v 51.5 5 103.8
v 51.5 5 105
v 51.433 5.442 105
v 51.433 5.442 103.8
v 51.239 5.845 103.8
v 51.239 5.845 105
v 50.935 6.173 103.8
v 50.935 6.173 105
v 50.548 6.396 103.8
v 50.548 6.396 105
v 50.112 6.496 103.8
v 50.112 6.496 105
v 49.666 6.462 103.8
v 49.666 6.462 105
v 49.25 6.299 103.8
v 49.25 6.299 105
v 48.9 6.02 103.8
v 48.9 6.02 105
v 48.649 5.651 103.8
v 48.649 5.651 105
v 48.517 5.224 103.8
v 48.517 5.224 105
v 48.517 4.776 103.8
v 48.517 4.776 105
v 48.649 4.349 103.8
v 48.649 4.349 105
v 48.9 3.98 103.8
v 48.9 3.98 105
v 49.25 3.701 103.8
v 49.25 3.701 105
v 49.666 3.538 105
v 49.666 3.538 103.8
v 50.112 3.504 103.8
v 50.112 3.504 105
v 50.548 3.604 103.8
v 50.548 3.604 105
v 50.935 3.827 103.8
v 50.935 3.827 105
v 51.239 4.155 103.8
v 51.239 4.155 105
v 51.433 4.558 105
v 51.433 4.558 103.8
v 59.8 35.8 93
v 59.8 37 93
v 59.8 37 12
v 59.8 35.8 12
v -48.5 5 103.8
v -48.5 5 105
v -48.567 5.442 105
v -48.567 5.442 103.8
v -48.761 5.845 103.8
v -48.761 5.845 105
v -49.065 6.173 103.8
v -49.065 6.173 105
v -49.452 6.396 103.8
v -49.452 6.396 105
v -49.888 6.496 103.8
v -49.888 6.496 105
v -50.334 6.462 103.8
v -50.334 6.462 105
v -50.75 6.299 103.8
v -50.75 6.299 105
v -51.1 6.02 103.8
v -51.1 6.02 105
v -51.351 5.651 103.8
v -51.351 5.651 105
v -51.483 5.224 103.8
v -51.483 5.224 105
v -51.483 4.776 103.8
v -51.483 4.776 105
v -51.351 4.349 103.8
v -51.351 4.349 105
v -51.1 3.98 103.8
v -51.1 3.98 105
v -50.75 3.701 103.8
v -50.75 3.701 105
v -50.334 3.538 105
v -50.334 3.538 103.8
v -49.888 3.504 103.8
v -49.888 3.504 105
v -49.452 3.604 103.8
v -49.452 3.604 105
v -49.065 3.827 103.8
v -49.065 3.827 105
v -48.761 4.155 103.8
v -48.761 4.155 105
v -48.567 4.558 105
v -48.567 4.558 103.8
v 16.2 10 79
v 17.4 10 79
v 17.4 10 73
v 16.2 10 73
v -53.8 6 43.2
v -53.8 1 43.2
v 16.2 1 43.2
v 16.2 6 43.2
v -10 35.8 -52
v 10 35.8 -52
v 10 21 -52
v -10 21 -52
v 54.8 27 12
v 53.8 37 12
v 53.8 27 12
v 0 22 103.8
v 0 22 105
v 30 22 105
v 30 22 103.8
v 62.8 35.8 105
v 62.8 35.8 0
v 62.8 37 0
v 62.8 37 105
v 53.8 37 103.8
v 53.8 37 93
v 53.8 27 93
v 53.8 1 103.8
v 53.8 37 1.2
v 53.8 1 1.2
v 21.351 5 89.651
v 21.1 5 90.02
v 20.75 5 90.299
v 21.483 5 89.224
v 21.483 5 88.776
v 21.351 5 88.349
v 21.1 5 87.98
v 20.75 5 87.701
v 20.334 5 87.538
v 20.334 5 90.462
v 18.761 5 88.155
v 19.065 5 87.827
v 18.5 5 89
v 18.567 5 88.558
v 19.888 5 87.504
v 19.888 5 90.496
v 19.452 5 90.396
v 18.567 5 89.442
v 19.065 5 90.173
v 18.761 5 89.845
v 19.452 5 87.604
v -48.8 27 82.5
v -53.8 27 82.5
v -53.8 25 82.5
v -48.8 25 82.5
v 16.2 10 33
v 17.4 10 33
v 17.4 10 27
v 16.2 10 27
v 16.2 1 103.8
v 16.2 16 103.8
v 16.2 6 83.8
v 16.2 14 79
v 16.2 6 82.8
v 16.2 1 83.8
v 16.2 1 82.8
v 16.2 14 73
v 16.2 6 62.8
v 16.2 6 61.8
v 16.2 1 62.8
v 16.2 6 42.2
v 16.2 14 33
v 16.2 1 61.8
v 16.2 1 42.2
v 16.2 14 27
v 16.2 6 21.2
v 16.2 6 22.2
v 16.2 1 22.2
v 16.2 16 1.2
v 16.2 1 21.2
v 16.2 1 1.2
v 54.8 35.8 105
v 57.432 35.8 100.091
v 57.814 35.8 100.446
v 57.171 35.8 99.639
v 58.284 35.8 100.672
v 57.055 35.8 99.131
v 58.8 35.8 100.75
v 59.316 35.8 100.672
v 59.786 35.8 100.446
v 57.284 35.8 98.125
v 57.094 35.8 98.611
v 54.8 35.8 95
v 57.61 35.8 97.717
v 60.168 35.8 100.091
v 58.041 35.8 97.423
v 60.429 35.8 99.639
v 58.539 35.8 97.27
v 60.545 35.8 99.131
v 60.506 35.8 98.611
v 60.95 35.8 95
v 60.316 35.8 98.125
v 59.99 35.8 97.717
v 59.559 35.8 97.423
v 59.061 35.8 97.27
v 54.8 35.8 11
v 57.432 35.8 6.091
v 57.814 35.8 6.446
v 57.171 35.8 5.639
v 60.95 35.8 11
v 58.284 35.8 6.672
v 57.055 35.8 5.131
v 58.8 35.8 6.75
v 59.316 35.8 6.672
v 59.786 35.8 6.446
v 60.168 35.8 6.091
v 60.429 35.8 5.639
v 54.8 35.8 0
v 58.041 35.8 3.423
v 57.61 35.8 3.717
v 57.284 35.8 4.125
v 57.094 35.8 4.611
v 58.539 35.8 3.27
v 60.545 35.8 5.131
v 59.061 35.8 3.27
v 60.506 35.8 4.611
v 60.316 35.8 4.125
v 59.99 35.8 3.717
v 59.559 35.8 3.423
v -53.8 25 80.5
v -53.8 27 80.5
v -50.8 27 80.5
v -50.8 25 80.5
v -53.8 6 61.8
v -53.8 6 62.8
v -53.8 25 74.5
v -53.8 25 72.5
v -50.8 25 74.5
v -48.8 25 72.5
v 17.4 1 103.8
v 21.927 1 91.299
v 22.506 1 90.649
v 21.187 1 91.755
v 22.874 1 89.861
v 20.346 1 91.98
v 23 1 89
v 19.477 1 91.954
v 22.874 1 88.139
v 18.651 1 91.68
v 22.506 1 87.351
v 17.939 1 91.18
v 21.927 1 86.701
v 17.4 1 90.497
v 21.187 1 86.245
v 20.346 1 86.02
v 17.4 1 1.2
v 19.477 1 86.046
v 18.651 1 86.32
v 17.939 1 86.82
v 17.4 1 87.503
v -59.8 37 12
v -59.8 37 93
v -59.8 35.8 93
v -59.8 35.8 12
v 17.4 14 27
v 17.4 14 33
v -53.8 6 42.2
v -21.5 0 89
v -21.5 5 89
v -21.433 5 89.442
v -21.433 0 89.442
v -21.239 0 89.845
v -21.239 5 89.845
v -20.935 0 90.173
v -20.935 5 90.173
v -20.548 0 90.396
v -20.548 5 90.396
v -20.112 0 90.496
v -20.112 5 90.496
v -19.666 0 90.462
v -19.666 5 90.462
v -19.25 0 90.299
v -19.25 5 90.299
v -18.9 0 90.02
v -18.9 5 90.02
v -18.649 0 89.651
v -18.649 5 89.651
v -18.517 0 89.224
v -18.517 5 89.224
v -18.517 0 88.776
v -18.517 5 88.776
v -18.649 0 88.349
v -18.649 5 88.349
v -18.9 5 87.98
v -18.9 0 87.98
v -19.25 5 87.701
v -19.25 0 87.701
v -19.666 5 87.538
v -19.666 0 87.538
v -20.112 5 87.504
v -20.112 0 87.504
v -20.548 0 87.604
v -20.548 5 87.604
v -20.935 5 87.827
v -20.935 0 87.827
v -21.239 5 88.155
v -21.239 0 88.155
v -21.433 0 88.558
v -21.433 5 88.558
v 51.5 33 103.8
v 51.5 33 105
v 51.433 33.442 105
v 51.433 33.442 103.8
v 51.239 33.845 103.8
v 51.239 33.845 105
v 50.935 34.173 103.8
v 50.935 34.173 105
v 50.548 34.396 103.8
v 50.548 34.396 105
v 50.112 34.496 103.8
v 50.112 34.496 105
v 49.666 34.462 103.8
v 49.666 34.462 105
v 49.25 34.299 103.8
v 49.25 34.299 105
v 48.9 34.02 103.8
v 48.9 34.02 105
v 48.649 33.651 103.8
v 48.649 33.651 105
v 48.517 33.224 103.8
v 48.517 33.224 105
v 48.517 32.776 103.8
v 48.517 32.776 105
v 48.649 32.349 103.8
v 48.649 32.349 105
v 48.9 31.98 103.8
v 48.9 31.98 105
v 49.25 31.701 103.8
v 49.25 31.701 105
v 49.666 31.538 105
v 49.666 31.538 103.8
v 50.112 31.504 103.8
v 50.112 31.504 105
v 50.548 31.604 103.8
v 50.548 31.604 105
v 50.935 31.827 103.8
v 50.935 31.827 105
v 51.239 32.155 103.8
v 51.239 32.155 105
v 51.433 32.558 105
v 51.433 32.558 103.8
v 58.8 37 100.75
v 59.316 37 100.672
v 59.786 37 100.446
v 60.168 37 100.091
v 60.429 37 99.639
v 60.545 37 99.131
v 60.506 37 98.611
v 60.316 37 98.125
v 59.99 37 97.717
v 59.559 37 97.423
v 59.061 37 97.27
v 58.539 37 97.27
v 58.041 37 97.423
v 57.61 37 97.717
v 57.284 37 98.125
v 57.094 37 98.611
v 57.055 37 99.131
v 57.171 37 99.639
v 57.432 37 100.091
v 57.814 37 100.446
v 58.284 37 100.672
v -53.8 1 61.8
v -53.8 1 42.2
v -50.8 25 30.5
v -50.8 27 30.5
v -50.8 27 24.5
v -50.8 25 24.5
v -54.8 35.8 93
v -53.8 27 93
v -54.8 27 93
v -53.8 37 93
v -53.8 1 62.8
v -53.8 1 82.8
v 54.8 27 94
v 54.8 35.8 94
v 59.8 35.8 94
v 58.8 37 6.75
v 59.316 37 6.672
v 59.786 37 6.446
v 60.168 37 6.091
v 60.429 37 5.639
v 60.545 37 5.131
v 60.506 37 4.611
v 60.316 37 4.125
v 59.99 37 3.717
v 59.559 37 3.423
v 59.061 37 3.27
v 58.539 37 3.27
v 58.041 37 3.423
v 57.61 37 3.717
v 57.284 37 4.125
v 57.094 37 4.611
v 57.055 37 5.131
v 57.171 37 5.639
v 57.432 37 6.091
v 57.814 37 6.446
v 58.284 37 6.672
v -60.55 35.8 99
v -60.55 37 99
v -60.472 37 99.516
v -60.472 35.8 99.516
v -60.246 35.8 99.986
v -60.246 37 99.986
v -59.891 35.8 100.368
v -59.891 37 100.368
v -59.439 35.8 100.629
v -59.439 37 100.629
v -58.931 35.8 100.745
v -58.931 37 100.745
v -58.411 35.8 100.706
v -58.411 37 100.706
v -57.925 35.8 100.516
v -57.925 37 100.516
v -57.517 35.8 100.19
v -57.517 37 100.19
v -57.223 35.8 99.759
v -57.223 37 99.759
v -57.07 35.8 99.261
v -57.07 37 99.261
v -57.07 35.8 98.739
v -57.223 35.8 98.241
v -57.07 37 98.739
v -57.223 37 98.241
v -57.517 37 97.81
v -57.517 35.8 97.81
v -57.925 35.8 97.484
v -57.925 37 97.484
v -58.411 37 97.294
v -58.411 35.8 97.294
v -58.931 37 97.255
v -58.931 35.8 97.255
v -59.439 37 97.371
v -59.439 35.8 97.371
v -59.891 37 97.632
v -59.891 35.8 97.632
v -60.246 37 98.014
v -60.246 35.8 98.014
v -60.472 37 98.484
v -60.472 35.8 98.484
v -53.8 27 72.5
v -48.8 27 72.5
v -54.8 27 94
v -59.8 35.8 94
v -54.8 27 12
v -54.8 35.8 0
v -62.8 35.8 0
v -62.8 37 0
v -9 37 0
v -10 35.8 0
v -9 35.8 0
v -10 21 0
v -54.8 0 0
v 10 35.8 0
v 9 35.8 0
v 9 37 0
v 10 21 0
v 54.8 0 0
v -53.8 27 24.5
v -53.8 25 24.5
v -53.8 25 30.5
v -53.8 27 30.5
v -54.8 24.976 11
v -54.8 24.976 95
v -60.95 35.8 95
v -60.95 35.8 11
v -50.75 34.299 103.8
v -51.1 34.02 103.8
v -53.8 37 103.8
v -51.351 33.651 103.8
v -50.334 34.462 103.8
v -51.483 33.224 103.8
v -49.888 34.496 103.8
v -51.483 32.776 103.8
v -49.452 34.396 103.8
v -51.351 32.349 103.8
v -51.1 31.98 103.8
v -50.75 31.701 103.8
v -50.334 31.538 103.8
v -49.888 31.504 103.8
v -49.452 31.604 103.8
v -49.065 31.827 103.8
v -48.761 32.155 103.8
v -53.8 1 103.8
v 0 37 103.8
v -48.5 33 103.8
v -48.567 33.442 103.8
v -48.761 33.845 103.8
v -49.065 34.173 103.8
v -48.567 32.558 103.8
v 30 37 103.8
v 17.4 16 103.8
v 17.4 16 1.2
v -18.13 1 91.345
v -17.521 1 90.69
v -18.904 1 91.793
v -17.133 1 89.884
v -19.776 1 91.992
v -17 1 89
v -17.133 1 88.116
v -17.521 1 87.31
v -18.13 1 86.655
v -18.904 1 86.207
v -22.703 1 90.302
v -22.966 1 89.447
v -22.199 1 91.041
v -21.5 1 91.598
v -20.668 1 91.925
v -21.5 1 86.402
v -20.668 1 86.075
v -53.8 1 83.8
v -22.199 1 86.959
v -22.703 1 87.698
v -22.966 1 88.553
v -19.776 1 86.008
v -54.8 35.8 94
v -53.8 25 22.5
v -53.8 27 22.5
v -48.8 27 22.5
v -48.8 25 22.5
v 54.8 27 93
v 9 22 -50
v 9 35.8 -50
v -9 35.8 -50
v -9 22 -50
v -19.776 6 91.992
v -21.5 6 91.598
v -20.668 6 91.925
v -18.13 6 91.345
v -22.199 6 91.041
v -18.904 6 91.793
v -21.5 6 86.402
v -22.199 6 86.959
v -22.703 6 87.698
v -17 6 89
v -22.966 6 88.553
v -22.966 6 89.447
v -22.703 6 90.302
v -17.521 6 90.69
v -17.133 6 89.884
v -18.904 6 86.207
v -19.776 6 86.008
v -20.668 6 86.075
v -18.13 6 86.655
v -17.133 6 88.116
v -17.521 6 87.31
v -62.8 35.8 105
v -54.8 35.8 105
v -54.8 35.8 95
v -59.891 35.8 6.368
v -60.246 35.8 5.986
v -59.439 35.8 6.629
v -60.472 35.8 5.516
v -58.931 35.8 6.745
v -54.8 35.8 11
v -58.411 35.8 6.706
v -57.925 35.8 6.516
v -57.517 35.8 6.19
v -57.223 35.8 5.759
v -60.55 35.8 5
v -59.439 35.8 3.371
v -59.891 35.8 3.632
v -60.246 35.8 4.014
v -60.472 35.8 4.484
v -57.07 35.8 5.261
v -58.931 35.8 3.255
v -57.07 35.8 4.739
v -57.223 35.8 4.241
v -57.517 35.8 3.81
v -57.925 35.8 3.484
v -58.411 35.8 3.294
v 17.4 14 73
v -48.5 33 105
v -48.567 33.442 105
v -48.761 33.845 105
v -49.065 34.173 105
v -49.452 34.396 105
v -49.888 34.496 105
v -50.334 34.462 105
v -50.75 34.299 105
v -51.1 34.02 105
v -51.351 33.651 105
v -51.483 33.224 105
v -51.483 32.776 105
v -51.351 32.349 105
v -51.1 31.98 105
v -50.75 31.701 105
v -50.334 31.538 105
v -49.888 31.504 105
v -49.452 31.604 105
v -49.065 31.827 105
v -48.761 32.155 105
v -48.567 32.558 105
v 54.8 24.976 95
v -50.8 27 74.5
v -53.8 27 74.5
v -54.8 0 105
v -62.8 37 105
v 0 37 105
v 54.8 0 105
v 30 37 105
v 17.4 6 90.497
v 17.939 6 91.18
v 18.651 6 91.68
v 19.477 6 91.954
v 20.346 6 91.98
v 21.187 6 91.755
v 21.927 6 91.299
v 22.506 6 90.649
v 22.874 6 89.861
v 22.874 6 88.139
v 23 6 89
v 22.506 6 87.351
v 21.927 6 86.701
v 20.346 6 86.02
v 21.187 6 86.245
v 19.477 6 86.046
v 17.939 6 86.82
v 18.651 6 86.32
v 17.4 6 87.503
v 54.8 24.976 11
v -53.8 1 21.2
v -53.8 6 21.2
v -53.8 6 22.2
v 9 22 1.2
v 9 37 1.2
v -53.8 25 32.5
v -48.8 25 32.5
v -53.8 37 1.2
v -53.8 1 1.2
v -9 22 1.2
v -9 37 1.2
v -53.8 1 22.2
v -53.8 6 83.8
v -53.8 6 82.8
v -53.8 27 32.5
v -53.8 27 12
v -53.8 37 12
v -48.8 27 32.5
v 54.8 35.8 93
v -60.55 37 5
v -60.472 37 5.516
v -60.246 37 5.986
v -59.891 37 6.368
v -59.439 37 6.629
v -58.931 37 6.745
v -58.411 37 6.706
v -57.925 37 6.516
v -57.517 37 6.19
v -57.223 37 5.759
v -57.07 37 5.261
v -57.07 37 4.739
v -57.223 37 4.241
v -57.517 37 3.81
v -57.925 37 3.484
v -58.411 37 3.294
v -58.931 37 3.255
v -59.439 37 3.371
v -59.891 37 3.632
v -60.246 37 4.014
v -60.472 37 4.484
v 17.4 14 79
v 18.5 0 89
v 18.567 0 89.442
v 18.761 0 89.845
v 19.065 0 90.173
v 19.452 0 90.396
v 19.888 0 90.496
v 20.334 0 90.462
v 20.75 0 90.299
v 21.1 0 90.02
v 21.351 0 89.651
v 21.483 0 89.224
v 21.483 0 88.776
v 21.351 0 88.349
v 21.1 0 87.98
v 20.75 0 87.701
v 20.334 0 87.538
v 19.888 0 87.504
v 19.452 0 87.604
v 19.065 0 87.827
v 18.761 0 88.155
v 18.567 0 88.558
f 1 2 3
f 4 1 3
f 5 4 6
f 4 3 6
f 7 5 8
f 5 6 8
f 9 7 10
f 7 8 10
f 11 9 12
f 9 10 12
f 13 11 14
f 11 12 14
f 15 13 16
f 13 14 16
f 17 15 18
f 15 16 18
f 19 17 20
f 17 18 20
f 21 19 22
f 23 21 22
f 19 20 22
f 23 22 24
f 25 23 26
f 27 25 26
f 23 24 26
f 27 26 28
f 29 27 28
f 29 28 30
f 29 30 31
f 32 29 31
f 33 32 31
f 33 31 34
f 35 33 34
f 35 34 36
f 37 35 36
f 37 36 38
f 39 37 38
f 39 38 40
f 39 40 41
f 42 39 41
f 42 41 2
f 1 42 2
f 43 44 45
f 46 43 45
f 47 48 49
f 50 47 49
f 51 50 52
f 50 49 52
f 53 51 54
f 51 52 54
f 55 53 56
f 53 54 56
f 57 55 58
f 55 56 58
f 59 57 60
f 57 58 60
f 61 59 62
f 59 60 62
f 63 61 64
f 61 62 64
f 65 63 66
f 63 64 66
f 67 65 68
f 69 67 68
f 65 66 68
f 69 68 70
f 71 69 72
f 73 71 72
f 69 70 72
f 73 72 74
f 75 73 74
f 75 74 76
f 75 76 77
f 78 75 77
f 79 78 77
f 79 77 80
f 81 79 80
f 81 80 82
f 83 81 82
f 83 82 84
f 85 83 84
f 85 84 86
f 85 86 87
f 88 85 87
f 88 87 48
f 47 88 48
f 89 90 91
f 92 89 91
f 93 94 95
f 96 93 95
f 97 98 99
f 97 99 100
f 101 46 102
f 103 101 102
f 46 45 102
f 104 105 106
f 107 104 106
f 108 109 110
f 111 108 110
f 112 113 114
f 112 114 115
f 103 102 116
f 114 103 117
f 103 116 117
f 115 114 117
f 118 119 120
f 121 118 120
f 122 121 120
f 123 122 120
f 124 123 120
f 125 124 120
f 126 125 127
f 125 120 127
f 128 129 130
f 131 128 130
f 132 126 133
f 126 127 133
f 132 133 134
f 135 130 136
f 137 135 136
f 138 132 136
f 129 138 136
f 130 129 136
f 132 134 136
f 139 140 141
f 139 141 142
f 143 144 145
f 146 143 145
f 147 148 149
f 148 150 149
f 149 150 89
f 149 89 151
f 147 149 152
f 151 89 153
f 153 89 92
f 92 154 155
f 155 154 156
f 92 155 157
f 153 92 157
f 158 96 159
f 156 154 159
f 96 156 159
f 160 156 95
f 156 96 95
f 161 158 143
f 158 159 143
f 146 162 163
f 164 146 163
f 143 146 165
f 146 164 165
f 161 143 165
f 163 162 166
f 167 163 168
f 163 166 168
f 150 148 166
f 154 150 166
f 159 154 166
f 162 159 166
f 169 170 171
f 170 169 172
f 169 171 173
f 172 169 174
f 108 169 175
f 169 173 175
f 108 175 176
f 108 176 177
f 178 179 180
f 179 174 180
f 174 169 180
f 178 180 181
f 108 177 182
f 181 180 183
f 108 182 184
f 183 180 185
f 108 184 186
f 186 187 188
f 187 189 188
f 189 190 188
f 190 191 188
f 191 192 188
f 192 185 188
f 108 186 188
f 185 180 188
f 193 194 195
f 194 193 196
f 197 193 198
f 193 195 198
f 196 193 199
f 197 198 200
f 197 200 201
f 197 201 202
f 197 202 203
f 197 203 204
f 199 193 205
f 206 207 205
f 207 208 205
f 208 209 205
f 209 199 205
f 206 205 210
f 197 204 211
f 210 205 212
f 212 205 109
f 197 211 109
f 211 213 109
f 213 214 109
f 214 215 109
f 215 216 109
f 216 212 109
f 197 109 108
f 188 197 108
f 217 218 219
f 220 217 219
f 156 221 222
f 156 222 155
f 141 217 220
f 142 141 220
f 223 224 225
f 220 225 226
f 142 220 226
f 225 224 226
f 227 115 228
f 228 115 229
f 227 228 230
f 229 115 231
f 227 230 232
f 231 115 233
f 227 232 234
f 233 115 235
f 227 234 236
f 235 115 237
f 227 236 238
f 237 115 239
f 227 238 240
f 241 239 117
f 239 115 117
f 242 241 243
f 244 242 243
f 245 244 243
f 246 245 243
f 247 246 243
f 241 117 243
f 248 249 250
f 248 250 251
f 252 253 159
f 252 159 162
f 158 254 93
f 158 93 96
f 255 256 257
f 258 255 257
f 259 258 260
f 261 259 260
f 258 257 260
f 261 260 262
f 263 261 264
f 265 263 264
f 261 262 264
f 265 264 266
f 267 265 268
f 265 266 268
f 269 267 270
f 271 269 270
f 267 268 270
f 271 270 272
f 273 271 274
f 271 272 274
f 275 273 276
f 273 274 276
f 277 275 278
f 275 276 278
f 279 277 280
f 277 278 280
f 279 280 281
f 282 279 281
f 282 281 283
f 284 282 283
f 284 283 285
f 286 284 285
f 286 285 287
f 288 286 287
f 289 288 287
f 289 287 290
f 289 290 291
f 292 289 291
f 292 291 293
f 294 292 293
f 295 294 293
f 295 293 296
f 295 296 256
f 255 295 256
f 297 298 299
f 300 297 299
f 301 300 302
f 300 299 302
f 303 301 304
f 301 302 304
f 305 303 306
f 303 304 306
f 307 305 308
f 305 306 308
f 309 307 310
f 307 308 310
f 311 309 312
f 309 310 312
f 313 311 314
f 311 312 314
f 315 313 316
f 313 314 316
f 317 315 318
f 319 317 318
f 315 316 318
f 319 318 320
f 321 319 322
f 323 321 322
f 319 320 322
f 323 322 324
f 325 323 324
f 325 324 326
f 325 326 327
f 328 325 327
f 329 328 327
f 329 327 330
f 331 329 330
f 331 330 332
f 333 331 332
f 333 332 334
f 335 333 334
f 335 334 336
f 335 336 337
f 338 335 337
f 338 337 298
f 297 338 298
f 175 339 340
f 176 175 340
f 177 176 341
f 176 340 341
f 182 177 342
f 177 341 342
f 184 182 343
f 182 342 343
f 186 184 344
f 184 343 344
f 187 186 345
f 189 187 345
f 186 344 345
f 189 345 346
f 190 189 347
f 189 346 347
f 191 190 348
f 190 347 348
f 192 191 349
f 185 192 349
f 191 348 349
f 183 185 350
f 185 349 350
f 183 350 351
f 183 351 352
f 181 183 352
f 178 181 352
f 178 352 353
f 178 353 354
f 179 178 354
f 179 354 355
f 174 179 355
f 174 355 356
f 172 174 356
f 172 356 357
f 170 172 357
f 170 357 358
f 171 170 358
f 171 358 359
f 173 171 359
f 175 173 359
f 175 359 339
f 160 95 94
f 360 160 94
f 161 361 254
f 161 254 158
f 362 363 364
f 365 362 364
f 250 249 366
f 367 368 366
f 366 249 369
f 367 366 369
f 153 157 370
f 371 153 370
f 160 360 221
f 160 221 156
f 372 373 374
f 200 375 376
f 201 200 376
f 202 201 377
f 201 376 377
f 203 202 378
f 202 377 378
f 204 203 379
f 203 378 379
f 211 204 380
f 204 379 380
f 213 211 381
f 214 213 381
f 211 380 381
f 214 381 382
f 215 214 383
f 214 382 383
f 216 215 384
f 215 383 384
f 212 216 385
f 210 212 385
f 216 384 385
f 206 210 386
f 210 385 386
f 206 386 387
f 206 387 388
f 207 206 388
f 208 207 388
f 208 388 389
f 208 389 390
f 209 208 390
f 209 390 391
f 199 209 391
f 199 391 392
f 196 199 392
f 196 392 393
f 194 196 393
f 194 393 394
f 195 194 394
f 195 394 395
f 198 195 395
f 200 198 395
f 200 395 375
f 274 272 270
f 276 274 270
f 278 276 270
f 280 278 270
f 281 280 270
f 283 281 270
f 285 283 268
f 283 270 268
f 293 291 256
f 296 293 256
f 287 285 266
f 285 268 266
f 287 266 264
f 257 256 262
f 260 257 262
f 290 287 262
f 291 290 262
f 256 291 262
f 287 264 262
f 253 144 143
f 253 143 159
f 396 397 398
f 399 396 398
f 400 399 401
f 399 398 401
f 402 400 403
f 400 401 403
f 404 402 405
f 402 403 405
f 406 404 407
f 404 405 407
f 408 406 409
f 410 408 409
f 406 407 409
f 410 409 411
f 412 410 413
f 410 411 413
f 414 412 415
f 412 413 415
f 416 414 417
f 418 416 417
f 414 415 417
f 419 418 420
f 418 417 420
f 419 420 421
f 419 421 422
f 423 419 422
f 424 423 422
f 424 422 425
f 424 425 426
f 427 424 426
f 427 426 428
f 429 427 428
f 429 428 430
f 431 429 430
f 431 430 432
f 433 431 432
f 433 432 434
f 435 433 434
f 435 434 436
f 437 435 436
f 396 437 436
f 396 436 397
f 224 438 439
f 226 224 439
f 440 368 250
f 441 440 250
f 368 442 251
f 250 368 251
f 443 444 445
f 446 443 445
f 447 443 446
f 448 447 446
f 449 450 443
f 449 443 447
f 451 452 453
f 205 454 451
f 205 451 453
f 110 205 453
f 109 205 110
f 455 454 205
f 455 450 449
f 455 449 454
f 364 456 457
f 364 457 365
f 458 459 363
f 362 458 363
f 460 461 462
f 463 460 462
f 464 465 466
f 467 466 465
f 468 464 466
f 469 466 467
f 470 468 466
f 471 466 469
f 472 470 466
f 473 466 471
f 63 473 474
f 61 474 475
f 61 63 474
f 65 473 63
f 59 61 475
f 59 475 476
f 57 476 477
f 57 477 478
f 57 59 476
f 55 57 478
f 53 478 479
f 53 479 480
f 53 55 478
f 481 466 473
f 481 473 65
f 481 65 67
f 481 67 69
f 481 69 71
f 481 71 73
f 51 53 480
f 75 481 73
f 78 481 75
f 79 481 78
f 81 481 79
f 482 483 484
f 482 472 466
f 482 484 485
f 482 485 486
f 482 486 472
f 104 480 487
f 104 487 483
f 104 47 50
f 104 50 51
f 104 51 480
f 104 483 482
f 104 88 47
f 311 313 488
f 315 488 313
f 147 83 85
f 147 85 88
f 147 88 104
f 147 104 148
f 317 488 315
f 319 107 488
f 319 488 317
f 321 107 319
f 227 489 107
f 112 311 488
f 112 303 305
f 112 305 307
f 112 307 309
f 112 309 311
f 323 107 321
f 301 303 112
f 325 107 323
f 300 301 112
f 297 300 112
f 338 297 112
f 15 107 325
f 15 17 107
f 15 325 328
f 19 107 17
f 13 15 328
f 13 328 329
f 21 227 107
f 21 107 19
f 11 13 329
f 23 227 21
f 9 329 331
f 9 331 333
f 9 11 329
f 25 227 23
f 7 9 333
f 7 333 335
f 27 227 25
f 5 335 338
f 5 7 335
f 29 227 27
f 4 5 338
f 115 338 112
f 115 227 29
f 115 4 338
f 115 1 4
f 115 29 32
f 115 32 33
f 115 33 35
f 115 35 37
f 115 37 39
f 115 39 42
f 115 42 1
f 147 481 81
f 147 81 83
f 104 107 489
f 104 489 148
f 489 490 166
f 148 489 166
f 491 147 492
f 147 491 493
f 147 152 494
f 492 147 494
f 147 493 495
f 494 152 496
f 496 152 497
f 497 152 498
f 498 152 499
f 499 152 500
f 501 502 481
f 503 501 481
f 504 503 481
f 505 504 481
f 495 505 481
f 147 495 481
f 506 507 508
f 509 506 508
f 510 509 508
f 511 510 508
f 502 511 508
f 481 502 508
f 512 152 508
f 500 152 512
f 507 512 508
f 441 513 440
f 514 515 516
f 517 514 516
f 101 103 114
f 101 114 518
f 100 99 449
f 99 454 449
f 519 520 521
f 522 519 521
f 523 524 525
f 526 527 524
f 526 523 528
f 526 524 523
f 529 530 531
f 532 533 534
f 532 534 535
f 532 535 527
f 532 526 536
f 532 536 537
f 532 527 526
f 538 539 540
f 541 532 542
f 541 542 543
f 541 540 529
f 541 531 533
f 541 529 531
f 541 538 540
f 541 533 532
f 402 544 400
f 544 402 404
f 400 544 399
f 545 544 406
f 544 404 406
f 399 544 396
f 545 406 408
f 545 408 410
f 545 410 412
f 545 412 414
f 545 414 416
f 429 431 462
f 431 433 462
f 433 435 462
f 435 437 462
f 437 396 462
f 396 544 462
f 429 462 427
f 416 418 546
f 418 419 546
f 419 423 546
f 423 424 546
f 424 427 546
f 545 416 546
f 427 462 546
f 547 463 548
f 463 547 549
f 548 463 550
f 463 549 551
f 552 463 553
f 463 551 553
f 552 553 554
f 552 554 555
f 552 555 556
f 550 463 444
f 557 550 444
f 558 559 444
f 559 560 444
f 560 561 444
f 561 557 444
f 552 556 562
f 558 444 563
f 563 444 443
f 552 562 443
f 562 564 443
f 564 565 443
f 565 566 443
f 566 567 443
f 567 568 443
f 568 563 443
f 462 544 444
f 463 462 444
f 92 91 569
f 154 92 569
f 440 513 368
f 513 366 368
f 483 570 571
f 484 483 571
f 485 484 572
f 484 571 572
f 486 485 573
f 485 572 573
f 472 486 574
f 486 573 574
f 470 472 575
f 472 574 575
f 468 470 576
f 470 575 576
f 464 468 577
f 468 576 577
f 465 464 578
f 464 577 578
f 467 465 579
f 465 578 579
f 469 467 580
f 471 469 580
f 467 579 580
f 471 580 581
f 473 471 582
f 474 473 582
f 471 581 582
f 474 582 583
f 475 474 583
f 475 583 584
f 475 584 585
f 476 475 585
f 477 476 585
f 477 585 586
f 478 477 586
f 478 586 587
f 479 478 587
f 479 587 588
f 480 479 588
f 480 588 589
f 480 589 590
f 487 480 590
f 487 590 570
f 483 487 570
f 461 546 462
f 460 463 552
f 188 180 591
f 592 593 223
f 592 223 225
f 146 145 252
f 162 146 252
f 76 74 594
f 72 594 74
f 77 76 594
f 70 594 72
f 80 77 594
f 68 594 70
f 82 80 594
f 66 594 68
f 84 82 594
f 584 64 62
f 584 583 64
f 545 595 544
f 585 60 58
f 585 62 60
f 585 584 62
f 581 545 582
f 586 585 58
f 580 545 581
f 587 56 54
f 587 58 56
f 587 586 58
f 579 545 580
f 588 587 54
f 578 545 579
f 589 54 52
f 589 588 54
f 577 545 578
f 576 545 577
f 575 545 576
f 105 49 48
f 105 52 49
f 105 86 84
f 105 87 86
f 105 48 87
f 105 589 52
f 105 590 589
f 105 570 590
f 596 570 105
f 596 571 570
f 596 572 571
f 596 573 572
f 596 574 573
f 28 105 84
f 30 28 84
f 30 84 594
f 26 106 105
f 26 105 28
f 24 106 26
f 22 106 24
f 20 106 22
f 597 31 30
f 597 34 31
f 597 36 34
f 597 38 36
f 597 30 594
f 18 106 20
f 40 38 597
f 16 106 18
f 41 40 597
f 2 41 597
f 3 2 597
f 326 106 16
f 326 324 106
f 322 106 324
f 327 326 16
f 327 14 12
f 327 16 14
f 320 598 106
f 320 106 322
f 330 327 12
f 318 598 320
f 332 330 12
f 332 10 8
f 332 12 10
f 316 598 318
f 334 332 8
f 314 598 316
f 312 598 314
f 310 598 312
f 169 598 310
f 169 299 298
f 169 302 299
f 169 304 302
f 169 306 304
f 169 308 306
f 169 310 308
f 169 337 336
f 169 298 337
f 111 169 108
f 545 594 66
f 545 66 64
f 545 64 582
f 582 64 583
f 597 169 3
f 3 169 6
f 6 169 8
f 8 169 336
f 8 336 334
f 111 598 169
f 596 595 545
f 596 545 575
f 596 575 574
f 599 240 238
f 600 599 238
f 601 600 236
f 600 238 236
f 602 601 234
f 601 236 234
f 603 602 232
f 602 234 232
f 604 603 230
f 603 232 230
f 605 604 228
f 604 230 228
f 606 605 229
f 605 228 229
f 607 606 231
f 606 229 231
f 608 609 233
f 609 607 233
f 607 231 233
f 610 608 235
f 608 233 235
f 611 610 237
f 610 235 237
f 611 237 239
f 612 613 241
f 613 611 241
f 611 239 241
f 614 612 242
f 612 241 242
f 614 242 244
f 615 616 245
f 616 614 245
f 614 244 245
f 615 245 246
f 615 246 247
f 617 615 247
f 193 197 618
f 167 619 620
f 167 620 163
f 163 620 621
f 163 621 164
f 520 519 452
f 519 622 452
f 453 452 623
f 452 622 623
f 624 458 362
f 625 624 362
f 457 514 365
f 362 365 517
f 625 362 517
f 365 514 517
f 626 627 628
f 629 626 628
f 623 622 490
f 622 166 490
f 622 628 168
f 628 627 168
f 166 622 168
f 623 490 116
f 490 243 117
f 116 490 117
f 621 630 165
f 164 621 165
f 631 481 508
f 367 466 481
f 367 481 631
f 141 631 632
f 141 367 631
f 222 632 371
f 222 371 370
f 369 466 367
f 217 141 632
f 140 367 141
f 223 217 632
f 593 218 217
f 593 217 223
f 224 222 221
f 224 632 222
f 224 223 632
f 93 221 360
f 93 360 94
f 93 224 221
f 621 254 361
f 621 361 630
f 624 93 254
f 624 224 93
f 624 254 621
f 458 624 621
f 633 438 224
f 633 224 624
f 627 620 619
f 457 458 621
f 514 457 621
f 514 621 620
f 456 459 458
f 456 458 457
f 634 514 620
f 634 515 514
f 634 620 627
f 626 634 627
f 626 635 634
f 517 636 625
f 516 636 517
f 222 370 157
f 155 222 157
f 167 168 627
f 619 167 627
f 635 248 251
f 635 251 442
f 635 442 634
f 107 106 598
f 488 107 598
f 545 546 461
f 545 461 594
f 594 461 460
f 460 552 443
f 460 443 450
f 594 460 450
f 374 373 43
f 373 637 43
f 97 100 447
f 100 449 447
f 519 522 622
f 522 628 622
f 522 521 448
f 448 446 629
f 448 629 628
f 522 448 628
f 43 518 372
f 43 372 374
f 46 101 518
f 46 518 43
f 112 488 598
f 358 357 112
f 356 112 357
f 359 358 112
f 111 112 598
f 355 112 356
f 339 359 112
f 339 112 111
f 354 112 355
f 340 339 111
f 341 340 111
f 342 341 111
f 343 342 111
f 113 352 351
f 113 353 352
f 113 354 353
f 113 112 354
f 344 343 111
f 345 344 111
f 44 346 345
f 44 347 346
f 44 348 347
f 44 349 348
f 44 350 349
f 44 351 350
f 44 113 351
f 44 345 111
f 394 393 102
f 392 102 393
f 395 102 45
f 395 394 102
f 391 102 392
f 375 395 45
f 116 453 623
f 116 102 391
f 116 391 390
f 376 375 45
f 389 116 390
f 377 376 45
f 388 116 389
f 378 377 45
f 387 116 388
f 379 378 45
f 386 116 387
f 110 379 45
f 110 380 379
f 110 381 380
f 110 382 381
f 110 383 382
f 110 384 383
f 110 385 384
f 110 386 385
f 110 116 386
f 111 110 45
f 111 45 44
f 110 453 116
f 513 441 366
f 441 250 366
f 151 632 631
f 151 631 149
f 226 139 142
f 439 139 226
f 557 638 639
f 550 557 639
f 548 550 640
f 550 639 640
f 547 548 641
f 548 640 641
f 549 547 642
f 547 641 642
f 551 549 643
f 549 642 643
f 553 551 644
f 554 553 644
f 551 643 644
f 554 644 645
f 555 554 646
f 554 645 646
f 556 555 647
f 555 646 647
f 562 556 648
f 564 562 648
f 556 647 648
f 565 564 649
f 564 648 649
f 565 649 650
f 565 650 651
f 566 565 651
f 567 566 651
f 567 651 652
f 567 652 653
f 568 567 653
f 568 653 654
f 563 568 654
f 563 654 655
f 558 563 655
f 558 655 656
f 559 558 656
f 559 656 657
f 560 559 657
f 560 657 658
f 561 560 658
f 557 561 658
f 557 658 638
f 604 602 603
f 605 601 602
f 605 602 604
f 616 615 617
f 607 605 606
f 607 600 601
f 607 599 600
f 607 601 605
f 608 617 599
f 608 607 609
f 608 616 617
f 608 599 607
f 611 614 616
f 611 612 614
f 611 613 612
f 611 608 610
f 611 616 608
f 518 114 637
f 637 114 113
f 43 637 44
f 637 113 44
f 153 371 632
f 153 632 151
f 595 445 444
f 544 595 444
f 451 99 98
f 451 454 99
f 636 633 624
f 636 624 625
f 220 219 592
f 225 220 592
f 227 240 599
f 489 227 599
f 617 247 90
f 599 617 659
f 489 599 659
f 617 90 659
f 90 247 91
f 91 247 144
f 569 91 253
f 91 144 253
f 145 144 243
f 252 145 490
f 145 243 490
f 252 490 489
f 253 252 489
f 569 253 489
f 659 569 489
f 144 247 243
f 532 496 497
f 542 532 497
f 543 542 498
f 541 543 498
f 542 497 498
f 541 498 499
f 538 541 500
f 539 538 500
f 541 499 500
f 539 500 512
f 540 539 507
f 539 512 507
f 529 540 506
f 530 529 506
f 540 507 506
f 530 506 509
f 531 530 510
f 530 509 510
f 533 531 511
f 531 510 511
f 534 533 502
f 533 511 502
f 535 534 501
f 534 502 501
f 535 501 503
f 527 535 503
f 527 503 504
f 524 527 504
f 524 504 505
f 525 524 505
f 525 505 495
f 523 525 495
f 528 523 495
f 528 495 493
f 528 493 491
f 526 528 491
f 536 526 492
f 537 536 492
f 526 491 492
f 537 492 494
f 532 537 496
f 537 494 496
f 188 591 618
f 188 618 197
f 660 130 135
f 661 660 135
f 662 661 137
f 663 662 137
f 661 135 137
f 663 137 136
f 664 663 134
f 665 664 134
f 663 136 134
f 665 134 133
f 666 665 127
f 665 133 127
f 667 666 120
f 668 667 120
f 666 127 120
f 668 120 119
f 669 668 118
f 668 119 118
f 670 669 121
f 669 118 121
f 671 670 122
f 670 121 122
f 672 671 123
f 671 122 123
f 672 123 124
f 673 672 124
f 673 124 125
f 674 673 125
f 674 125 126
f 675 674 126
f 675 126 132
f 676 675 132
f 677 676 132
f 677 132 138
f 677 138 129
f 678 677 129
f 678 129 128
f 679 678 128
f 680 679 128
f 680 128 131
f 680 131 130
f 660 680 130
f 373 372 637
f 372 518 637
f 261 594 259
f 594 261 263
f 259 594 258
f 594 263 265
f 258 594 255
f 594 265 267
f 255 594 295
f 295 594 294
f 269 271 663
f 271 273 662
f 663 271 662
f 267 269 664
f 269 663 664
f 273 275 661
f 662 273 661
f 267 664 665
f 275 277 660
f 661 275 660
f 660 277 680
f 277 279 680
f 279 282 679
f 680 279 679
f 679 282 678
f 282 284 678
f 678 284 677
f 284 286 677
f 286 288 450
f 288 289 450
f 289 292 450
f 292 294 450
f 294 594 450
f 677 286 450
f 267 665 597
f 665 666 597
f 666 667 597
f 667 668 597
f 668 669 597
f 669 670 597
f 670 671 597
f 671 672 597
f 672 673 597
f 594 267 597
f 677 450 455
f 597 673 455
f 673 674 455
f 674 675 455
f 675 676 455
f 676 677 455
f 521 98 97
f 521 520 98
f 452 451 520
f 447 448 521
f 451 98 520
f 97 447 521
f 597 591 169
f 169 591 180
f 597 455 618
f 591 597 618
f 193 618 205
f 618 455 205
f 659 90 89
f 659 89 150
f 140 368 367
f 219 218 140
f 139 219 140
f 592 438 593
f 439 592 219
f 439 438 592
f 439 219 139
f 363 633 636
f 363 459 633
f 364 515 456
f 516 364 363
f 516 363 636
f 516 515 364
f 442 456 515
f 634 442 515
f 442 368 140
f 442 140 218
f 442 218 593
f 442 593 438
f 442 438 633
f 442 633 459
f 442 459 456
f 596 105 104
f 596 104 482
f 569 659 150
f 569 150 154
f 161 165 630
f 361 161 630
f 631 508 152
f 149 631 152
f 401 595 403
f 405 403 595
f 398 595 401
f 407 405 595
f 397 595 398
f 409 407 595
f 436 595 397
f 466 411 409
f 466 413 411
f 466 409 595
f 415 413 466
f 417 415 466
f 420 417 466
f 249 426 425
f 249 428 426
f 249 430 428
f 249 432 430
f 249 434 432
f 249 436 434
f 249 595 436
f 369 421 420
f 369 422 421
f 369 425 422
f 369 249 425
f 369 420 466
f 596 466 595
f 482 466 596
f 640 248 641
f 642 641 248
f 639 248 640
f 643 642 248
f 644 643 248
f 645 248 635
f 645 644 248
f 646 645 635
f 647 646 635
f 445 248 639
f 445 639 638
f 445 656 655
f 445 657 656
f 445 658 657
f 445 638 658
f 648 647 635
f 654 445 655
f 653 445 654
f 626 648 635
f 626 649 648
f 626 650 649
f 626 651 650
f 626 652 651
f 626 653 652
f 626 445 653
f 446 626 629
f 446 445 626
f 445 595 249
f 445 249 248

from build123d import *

# Parameters (mm, degrees)
EXTRUDE_1_DEPTH     = 105
SKETCH_3_W          = 107.6
SKETCH_3_H          = 1.2
EXTRUDE_3_DEPTH     = 36
SKETCH_4_R          = 3
SKETCH_4_W          = 70
SKETCH_4_H          = 1
EXTRUDE_4_DEPTH     = 5
CUT_EXTRUDE_1_REACH = 129.213
CUT_EXTRUDE_START   = -1
SKETCH_5_R          = 1.5
SKETCH_6_R          = 1.75
SKETCH_6_W          = 6
SKETCH_6_H          = 81
CUT_EXTRUDE_2_DEPTH = 10
EXTRUDE_8_DEPTH     = 82
EXTRUDE_9_DEPTH     = 1
EXTRUDE_10_DEPTH    = 1
CUT_EXTRUDE_3_REACH = 128.836
SKETCH_11_W         = 18
SKETCH_11_H         = 15
CUT_EXTRUDE_4_REACH = 129.82
SKETCH_12_R         = 1.5
SKETCH_12_W         = 30
SKETCH_12_H         = 15
EXTRUDE_11_DEPTH    = 50
SKETCH_14_W         = 20
SKETCH_14_H         = 14.8
EXTRUDE_12_DEPTH    = 2
SKETCH_15_W         = 6
SKETCH_15_H         = 10
SKETCH_15_W_2       = 3
SKETCH_15_H_2       = 6
EXTRUDE_13_DEPTH    = 2
CUT_EXTRUDE_5_REACH = 139.208
SKETCH_16_W         = 6
SKETCH_16_H         = 4


with BuildPart() as part:
    # 草图1 → 凸台-拉伸1 (new body)
    with BuildSketch(Plane.XY):
        Polygon((-54.8, 0), (54.8, 0), (54.8, 35.8), (62.8, 35.8), (62.8, 37), (53.8, 37), (53.8, 1), (17.4, 1), (17.4, 16), (16.2, 16), (16.2, 1), (-53.8, 1), (-53.8, 37), (-62.8, 37), (-62.8, 35.8), (-54.8, 35.8), align=None)
    extrude(amount=EXTRUDE_1_DEPTH)

    # 草图3 → 凸台-拉伸3 (add)
    with BuildSketch(Plane(origin=(0, 1, 0), x_dir=(1, 0, 0), z_dir=(0, 1, 0))):
        with Locations((0, -0.6)):
            Rectangle(SKETCH_3_W, SKETCH_3_H)
        with Locations((0, -104.4)):
            Rectangle(SKETCH_3_W, SKETCH_3_H)
    extrude(amount=EXTRUDE_3_DEPTH)

    # 草图4 → 凸台-拉伸4 (add)
    with BuildSketch(Plane(origin=(0, 1, 0), x_dir=(1, 0, 0), z_dir=(0, 1, 0))):
        with Locations((20, -89)):
            Circle(SKETCH_4_R)
        with Locations((-20, -89)):
            Circle(SKETCH_4_R)
        with Locations((-18.8, -21.7)):
            Rectangle(SKETCH_4_W, SKETCH_4_H)
        with Locations((-18.8, -42.7)):
            Rectangle(SKETCH_4_W, SKETCH_4_H)
        with Locations((-18.8, -62.3)):
            Rectangle(SKETCH_4_W, SKETCH_4_H)
        with Locations((-18.8, -83.3)):
            Rectangle(SKETCH_4_W, SKETCH_4_H)
    extrude(amount=EXTRUDE_4_DEPTH)

    # 草图5 → 切除-拉伸1 (cut, up to next)
    with BuildSketch(Plane(origin=(0, 6, 0), x_dir=(1, 0, 0), z_dir=(0, 1, 0)).offset(CUT_EXTRUDE_START), mode=Mode.PRIVATE) as cut_extrude_1_sk1:
        with Locations(Location((20, -89, 0), (0, 0, 180))):
            Circle(SKETCH_5_R)
    cut_extrude_1_tool1 = extrude(cut_extrude_1_sk1.sketch, amount=-CUT_EXTRUDE_1_REACH, mode=Mode.PRIVATE) & part.part
    # 草图5 → 切除-拉伸1 (cut, up to next)
    with BuildSketch(Plane(origin=(0, 6, 0), x_dir=(1, 0, 0), z_dir=(0, 1, 0)).offset(CUT_EXTRUDE_START), mode=Mode.PRIVATE) as cut_extrude_1_sk2:
        with Locations(Location((-20, -89, 0), (0, 0, 180))):
            Circle(SKETCH_5_R)
    cut_extrude_1_tool2 = extrude(cut_extrude_1_sk2.sketch, amount=-CUT_EXTRUDE_1_REACH, mode=Mode.PRIVATE) & part.part
    add(cut_extrude_1_tool1.solids().sort_by_distance((20, 5, 89))[0], mode=Mode.SUBTRACT)
    add(cut_extrude_1_tool2.solids().sort_by_distance((-20, 5, 89))[0], mode=Mode.SUBTRACT)

    # 草图6 → 切除-拉伸2 (cut)
    with BuildSketch(Plane(origin=(0, 37, 0), x_dir=(1, 0, 0), z_dir=(0, 1, 0))):
        with Locations(Location((58.8, -5, 0), (0, 0, 270))):
            Circle(SKETCH_6_R)
        with Locations(Location((58.8, -99, 0), (0, 0, 270))):
            Circle(SKETCH_6_R)
        with Locations(Location((-58.8, -99, 0), (0, 0, 180))):
            Circle(SKETCH_6_R)
        with Locations(Location((-58.8, -5, 0), (0, 0, 180))):
            Circle(SKETCH_6_R)
        with Locations((-56.8, -52.5)):
            Rectangle(SKETCH_6_W, SKETCH_6_H)
        with Locations((56.8, -52.5)):
            Rectangle(SKETCH_6_W, SKETCH_6_H)
    extrude(amount=-CUT_EXTRUDE_2_DEPTH, mode=Mode.SUBTRACT)

    # 草图7 → 凸台-拉伸8 (add)
    with BuildSketch(Plane.XY.offset(12)):
        Polygon((60.950143721, 35.8), (54.8, 24.975747051), (54.8, 27), (59.8, 35.8), align=None)
        Polygon((-54.8, 24.975747051), (-54.8, 27), (-59.8, 35.8), (-60.950143721, 35.8), align=None)
    extrude(amount=EXTRUDE_8_DEPTH)

    # 草图8 → 凸台-拉伸9 (add)
    with BuildSketch(Plane(origin=(0, 0, 12), x_dir=(-1, 0, 0), z_dir=(0, 0, -1))):
        Polygon((-54.8, 35.8), (-60.950143721, 35.8), (-54.8, 24.975747051), align=None)
        Polygon((54.8, 24.975747051), (54.8, 35.8), (60.950143721, 35.8), align=None)
    extrude(amount=EXTRUDE_9_DEPTH)

    # 草图10 → 凸台-拉伸10 (add)
    with BuildSketch(Plane.XY.offset(94)):
        Polygon((-60.950143721, 35.8), (-54.8, 35.8), (-54.8, 24.975747051), align=None)
        Polygon((54.8, 24.975747051), (60.950143721, 35.8), (54.8, 35.8), align=None)
    extrude(amount=EXTRUDE_10_DEPTH)

    # 草图11 → 切除-拉伸3 (cut, up to next)
    with BuildSketch(Plane.XY.offset(1.2), mode=Mode.PRIVATE) as cut_extrude_3_sk1:
        with Locations((0, 29.5)):
            Rectangle(SKETCH_11_W, SKETCH_11_H)
    cut_extrude_3_tool1 = extrude(cut_extrude_3_sk1.sketch, amount=-CUT_EXTRUDE_3_REACH, mode=Mode.PRIVATE) & part.part
    add(cut_extrude_3_tool1.solids().sort_by_distance((0, 29.5, 1.2))[0], mode=Mode.SUBTRACT)

    # 草图12 → 切除-拉伸4 (cut, up to next)
    with BuildSketch(Plane.XY.offset(105), mode=Mode.PRIVATE) as cut_extrude_4_sk1:
        with Locations((50, 5)):
            Circle(SKETCH_12_R)
    cut_extrude_4_tool1 = extrude(cut_extrude_4_sk1.sketch, amount=-CUT_EXTRUDE_4_REACH, mode=Mode.PRIVATE) & part.part
    # 草图12 → 切除-拉伸4 (cut, up to next)
    with BuildSketch(Plane.XY.offset(105), mode=Mode.PRIVATE) as cut_extrude_4_sk2:
        with Locations((50, 33)):
            Circle(SKETCH_12_R)
    cut_extrude_4_tool2 = extrude(cut_extrude_4_sk2.sketch, amount=-CUT_EXTRUDE_4_REACH, mode=Mode.PRIVATE) & part.part
    # 草图12 → 切除-拉伸4 (cut, up to next)
    with BuildSketch(Plane.XY.offset(105), mode=Mode.PRIVATE) as cut_extrude_4_sk3:
        with Locations((-50, 33)):
            Circle(SKETCH_12_R)
    cut_extrude_4_tool3 = extrude(cut_extrude_4_sk3.sketch, amount=-CUT_EXTRUDE_4_REACH, mode=Mode.PRIVATE) & part.part
    # 草图12 → 切除-拉伸4 (cut, up to next)
    with BuildSketch(Plane.XY.offset(105), mode=Mode.PRIVATE) as cut_extrude_4_sk4:
        with Locations((-50, 5)):
            Circle(SKETCH_12_R)
    cut_extrude_4_tool4 = extrude(cut_extrude_4_sk4.sketch, amount=-CUT_EXTRUDE_4_REACH, mode=Mode.PRIVATE) & part.part
    # 草图12 → 切除-拉伸4 (cut, up to next)
    with BuildSketch(Plane.XY.offset(105), mode=Mode.PRIVATE) as cut_extrude_4_sk5:
        with Locations((15, 29.5)):
            Rectangle(SKETCH_12_W, SKETCH_12_H)
    cut_extrude_4_tool5 = extrude(cut_extrude_4_sk5.sketch, amount=-CUT_EXTRUDE_4_REACH, mode=Mode.PRIVATE) & part.part
    add(cut_extrude_4_tool1.solids().sort_by_distance((50, 5, 105))[0], mode=Mode.SUBTRACT)
    add(cut_extrude_4_tool2.solids().sort_by_distance((50, 33, 105))[0], mode=Mode.SUBTRACT)
    add(cut_extrude_4_tool3.solids().sort_by_distance((-50, 33, 105))[0], mode=Mode.SUBTRACT)
    add(cut_extrude_4_tool4.solids().sort_by_distance((-50, 5, 105))[0], mode=Mode.SUBTRACT)
    add(cut_extrude_4_tool5.solids().sort_by_distance((15, 29.5, 105))[0], mode=Mode.SUBTRACT)

    # 草图13 → 凸台-拉伸11 (add)
    with BuildSketch(Plane(origin=(0, 0, 0), x_dir=(-1, 0, 0), z_dir=(0, 0, -1))):
        Polygon((9, 35.8), (9, 22), (-9, 22), (-9, 35.8), (-10, 35.8), (-10, 21), (10, 21), (10, 35.8), align=None)
    extrude(amount=EXTRUDE_11_DEPTH)

    # 草图14 → 凸台-拉伸12 (add)
    with BuildSketch(Plane(origin=(0, 0, -50), x_dir=(-1, 0, 0), z_dir=(0, 0, -1))):
        with Locations((0, 28.4)):
            Rectangle(SKETCH_14_W, SKETCH_14_H)
    extrude(amount=EXTRUDE_12_DEPTH)

    # 草图15 → 凸台-拉伸13 (add)
    # profile 1 of 2: a face of its own
    with BuildSketch(Plane(origin=(0, 27, 0), x_dir=(1, 0, 0), z_dir=(0, 1, 0))):
        with Locations((-51.8, -27.5)):
            Rectangle(SKETCH_15_W, SKETCH_15_H)
        with Locations((-52.3, -27.5)):
            Rectangle(SKETCH_15_W_2, SKETCH_15_H_2, mode=Mode.SUBTRACT)
    # profile 2 of 2: a face of its own
    with BuildSketch(Plane(origin=(0, 27, 0), x_dir=(1, 0, 0), z_dir=(0, 1, 0))):
        with Locations((-51.8, -77.5)):
            Rectangle(SKETCH_15_W, SKETCH_15_H)
        with Locations((-52.3, -77.5)):
            Rectangle(SKETCH_15_W_2, SKETCH_15_H_2, mode=Mode.SUBTRACT)
    extrude(amount=-EXTRUDE_13_DEPTH)

    # 草图16 → 切除-拉伸5 (cut, up to next)
    with BuildSketch(Plane(origin=(17.4, 0, 0), x_dir=(0, 0, -1), z_dir=(1, 0, 0)), mode=Mode.PRIVATE) as cut_extrude_5_sk1:
        with Locations((-76, 12)):
            Rectangle(SKETCH_16_W, SKETCH_16_H)
    cut_extrude_5_tool1 = extrude(cut_extrude_5_sk1.sketch, amount=-CUT_EXTRUDE_5_REACH, mode=Mode.PRIVATE) & part.part
    # 草图16 → 切除-拉伸5 (cut, up to next)
    with BuildSketch(Plane(origin=(17.4, 0, 0), x_dir=(0, 0, -1), z_dir=(1, 0, 0)), mode=Mode.PRIVATE) as cut_extrude_5_sk2:
        with Locations((-30, 12)):
            Rectangle(SKETCH_16_W, SKETCH_16_H)
    cut_extrude_5_tool2 = extrude(cut_extrude_5_sk2.sketch, amount=-CUT_EXTRUDE_5_REACH, mode=Mode.PRIVATE) & part.part
    add(cut_extrude_5_tool1.solids().sort_by_distance((17.4, 12, 76))[0], mode=Mode.SUBTRACT)
    add(cut_extrude_5_tool2.solids().sort_by_distance((17.4, 12, 30))[0], mode=Mode.SUBTRACT)


solid = part.part
